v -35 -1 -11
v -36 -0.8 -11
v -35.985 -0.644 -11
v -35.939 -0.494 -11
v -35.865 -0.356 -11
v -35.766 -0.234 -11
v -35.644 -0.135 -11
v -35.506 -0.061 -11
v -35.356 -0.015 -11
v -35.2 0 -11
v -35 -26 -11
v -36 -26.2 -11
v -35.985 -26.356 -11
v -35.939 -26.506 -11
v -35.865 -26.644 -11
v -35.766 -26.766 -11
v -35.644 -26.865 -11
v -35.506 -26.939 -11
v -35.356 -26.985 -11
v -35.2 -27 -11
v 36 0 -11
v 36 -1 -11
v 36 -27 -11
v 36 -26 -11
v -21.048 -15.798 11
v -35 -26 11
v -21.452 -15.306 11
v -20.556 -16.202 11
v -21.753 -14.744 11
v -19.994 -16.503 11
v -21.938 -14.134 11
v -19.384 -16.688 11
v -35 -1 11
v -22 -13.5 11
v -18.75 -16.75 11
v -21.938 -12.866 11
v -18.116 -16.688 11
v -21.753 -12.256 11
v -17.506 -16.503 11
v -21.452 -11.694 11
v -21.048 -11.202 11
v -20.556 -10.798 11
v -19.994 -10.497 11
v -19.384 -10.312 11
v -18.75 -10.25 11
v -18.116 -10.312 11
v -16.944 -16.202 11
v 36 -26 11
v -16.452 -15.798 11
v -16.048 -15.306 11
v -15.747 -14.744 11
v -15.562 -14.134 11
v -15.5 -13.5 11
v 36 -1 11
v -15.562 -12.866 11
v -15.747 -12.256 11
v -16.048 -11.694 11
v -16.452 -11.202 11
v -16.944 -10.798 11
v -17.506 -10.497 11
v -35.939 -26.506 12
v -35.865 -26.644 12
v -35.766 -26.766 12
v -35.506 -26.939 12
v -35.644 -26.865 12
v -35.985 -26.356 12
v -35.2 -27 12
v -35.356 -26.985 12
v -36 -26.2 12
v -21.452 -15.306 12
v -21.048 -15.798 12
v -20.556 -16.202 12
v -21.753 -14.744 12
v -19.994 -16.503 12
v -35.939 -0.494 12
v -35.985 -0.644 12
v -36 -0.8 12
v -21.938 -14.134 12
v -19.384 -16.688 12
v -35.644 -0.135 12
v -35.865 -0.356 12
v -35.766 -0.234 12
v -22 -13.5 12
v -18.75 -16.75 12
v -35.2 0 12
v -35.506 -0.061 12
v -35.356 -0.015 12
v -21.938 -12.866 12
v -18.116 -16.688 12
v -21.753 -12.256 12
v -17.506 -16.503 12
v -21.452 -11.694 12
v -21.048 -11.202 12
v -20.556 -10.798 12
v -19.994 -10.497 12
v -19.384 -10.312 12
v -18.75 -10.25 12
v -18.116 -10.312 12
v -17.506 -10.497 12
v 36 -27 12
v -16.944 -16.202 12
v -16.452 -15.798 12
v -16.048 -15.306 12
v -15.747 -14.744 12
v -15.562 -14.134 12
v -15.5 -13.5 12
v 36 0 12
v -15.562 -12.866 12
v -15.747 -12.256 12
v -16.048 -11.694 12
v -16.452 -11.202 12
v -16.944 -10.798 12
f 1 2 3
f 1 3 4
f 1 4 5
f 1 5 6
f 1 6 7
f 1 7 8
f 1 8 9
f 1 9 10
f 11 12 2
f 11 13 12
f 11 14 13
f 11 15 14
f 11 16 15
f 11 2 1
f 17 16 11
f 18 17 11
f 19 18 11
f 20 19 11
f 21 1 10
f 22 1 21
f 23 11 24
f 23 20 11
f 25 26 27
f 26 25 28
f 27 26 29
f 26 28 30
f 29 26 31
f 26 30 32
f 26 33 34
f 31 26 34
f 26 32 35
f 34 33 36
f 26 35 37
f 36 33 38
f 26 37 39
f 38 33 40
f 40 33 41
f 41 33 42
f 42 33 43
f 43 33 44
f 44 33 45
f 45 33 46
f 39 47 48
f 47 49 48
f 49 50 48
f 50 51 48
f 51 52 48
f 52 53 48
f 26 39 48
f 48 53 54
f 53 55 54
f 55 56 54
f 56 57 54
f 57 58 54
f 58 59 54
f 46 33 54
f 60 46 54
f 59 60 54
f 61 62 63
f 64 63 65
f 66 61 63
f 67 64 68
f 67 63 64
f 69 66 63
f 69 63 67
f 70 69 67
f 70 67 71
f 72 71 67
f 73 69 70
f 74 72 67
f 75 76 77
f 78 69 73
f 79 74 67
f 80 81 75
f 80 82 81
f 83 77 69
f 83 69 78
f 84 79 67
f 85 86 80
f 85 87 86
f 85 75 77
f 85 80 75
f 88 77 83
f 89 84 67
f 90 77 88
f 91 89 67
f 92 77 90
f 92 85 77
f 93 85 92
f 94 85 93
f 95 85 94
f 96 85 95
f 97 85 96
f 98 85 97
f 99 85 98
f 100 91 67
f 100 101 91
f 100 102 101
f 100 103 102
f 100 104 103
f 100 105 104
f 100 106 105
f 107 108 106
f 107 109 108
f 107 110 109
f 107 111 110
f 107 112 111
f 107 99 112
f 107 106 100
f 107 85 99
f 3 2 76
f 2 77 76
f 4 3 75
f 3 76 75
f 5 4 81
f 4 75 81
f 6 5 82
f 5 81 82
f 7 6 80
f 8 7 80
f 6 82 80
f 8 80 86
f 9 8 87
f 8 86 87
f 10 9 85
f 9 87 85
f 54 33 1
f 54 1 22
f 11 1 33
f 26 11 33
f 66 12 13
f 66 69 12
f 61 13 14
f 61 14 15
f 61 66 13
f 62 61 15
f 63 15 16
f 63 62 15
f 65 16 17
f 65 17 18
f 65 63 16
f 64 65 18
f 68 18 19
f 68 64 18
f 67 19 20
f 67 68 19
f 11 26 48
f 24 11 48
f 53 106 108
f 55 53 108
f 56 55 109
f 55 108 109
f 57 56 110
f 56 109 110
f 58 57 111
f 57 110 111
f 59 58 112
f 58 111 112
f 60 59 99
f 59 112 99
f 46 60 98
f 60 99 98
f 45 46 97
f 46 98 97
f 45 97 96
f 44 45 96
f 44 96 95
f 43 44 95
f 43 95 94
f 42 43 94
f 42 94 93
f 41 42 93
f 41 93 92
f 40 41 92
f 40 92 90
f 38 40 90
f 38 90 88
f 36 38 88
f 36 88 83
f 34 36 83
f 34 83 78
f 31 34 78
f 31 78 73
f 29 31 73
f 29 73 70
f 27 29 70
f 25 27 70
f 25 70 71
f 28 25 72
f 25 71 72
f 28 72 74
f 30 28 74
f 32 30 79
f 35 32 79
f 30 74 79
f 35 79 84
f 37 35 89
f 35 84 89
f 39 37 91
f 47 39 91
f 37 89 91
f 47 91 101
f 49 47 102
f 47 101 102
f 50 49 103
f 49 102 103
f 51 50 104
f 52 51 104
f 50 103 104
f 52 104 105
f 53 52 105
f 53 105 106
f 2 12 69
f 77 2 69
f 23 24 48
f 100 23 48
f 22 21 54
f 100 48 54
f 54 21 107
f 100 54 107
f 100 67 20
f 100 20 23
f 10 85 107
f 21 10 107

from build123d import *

# Parameters (mm, degrees)
F0_W     = 72
F0_H     = 24
F1_DEPTH = 27
F2_T     = -1
F3_R     = 3.25
F4_DEPTH = 25
F5_W     = 72
F5_H     = 27
F5_R     = 3.25
F6_DEPTH = 1
F8_DEPTH = 1
F9_R     = 0.8


# Not quite as in the source:
# - a feature names something its author has since deleted; it is built from what else it names


with BuildPart() as f1:
    # F0 (on Front) → F1 (new body)
    with BuildSketch(Plane.XZ):
        Rectangle(F0_W, F0_H)
    extrude(amount=F1_DEPTH)

    # F2
    f2_openings = [f1.faces().sort_by_distance(p)[0] for p in [
        (36, -13.5, 0),
    ]]
    offset(amount=F2_T, openings=f2_openings)

    # F3 (on face) → F4 (cut)
    with BuildSketch(Plane.XY.offset(12)):
        with Locations((-18.75, -13.5)):
            Circle(F3_R)
    extrude(amount=-F4_DEPTH, mode=Mode.SUBTRACT)

    # F5 (on face) → F6 (cut)
    with BuildSketch(Plane(origin=(0, 0, -12), x_dir=(1, 0, 0), z_dir=(0, 0, -1))):
        with Locations((0, 13.5)):
            Rectangle(F5_W, F5_H)
        with Locations((-18.75, 13.5)):
            Circle(F5_R, mode=Mode.SUBTRACT)
    extrude(amount=-F6_DEPTH, mode=Mode.SUBTRACT)

    # F9
    f9_edges = [f1.edges().sort_by_distance(p)[0] for p in [
        (-36, -27, 0.5),
        (-36, 0, 0.5),
    ]]
    fillet(f9_edges, radius=F9_R)


with BuildPart() as f8:
    # F7 (on face) → F8 (new body)
    with BuildSketch(Plane.XY.offset(12)):
        with BuildLine():
            Line((-36, -1), (-36, -27))
            Line((-36, -27), (36, -27))
            Line((36, -27), (36, -16.75))
            Line((36, -16.75), (-18.75, -16.75))
            ThreePointArc((-18.75, -16.75), (-22, -13.5), (-18.75, -10.25))
            Line((-18.75, -10.25), (36, -10.25))
            Line((36, -10.25), (36, -1))
            Line((36, -1), (-36, -1))
        make_face()
    extrude(amount=F8_DEPTH)


solid = f1.part
